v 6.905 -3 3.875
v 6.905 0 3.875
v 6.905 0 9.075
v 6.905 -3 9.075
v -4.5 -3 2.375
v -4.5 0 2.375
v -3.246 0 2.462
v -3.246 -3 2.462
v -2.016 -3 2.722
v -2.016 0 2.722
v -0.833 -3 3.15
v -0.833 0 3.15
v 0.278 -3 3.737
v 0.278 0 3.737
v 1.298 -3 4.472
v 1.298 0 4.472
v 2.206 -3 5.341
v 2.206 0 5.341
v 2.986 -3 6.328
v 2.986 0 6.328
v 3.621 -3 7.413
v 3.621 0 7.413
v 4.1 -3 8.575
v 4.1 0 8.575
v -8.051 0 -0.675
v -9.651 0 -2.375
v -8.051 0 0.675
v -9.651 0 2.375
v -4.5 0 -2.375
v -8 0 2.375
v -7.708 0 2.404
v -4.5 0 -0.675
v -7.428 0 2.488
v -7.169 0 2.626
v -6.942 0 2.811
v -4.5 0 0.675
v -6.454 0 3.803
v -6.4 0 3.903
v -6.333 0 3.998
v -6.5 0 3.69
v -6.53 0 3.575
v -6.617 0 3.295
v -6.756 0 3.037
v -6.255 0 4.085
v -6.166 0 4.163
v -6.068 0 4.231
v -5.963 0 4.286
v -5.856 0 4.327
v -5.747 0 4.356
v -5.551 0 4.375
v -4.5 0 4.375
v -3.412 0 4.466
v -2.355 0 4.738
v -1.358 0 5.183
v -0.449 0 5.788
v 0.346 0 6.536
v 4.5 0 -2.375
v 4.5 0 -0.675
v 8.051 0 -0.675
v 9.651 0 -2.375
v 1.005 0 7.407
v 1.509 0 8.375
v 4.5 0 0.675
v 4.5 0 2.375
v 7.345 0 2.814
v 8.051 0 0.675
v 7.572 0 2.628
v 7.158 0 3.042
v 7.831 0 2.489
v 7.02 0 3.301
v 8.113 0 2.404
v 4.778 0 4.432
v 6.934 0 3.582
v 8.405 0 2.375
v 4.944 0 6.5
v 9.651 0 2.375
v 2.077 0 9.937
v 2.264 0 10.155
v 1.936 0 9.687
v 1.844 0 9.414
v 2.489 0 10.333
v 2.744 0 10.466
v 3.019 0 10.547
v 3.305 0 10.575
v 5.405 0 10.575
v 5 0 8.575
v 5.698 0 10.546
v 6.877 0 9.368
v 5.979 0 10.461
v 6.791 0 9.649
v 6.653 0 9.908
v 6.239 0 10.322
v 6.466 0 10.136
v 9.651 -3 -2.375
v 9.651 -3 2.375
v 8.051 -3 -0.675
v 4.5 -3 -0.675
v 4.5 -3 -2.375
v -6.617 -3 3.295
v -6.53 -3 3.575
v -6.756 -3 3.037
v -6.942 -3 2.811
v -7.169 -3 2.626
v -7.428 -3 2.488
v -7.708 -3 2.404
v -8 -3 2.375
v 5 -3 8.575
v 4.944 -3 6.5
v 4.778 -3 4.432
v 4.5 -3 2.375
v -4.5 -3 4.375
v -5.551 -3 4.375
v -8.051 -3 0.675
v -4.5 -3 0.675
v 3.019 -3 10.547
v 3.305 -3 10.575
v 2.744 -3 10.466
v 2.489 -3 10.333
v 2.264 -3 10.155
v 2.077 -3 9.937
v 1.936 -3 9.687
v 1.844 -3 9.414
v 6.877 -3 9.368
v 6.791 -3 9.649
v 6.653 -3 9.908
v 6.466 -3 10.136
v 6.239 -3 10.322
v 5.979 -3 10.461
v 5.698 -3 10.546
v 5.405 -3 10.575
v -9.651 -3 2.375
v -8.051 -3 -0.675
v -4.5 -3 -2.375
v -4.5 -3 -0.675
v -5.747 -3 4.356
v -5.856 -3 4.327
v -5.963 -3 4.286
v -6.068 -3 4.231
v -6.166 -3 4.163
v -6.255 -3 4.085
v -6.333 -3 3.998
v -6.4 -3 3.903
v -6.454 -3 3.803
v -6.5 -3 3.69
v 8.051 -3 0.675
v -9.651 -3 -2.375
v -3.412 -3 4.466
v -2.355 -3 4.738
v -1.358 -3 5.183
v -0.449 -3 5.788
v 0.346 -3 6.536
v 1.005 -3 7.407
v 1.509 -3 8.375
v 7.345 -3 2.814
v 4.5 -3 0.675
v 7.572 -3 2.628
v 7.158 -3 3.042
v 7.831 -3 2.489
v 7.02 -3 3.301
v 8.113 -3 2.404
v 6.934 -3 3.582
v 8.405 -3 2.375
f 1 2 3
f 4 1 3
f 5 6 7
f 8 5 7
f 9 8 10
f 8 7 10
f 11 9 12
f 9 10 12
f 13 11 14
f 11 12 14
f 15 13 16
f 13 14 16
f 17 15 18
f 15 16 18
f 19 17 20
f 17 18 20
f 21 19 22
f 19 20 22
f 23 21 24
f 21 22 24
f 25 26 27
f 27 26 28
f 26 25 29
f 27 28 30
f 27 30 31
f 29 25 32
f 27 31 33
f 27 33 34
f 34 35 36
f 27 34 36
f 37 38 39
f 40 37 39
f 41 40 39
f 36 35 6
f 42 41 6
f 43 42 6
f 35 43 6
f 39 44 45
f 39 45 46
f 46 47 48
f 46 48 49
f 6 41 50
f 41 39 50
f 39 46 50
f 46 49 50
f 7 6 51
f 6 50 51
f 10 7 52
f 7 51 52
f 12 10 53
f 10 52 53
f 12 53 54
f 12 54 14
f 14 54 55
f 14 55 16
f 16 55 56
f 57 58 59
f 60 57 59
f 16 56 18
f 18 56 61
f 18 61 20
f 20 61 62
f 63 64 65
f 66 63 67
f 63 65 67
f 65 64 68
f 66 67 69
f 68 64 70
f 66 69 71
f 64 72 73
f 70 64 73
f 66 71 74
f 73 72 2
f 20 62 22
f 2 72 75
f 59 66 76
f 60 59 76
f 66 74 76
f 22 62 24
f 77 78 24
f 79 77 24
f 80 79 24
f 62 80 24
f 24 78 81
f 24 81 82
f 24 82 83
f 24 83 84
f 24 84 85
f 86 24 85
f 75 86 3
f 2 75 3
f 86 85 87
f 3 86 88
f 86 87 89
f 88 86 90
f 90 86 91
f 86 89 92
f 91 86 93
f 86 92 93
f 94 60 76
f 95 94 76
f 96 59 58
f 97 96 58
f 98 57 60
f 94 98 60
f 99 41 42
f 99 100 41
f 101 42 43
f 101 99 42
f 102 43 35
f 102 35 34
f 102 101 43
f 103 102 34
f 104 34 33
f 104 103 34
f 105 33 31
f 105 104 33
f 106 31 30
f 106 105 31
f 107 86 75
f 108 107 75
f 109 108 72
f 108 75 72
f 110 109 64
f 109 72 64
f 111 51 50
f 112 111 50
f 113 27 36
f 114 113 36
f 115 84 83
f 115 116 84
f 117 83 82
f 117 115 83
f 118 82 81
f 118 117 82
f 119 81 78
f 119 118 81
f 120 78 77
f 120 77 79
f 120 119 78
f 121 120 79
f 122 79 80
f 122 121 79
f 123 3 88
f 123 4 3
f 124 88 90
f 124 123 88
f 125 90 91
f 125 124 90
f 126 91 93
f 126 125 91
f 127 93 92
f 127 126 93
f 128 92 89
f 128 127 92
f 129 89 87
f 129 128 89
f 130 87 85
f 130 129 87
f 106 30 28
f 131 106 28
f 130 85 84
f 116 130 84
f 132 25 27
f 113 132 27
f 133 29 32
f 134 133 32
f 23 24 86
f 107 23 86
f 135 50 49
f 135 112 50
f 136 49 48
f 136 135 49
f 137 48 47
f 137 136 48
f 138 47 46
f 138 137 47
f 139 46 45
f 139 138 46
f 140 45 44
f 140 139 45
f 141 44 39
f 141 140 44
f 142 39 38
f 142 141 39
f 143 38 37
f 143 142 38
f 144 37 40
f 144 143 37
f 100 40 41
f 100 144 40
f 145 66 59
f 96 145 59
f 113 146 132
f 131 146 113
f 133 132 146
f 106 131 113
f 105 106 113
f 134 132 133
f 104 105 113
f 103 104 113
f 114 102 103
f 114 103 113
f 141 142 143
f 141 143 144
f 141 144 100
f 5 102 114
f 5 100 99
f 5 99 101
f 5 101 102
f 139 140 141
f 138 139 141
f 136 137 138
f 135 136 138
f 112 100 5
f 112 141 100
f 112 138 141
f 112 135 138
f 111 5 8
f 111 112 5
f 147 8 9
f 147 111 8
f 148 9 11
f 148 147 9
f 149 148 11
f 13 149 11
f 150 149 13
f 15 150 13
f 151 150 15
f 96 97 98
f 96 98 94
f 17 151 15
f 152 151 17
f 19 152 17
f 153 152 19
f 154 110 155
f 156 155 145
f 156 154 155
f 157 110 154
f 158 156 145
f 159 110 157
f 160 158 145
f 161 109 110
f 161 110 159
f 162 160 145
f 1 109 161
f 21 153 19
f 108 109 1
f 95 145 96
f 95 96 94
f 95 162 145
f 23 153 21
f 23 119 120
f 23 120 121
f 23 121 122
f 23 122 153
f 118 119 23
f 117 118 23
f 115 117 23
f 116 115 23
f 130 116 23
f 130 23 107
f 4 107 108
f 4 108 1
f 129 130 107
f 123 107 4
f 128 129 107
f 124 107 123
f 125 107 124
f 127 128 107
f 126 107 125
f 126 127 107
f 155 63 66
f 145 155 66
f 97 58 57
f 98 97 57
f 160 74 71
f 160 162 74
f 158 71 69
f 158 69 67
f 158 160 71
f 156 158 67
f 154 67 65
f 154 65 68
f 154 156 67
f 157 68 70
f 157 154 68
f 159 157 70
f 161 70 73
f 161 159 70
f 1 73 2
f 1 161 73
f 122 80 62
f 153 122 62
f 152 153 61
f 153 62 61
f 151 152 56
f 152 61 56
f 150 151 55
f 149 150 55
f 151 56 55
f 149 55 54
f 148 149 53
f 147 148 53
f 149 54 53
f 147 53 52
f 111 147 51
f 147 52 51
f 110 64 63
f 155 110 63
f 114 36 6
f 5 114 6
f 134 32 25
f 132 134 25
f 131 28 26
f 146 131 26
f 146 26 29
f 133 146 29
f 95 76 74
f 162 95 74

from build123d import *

# Parameters (mm, degrees)
F1_DEPTH = 3
F2_R     = 1.5
F3_R     = 1


with BuildPart() as f1:
    # F0 (on Front) → F1 (new body)
    with BuildSketch(Plane.XZ):
        with BuildLine():
            Line((8.050567, 0.675), (8.050567, -0.675))
            Line((8.050567, -0.675), (4.5, -0.675))
            Line((4.5, -0.675), (4.5, -2.375))
            Line((4.5, -2.375), (9.650567, -2.375))
            Line((9.650567, -2.375), (9.650567, 2.375))
            Line((9.650567, 2.375), (6.905382, 2.375))
            Line((6.905382, 2.375), (6.905382, 10.575))
            Line((6.905382, 10.575), (4.905382, 10.575))
            Line((4.905382, 10.575), (2.005382, 10.575))
            ThreePointArc((2.005382, 10.575), (-0.006672, 6.173255), (-4.5, 4.375))
            Line((-4.5, 4.375), (-6.5, 4.375))
            Line((-6.5, 4.375), (-6.5, 2.375))
            Line((-6.5, 2.375), (-9.650567, 2.375))
            Line((-9.650567, 2.375), (-9.650567, -2.375))
            Line((-9.650567, -2.375), (-4.5, -2.375))
            Line((-4.5, -2.375), (-4.5, -0.675))
            Line((-4.5, -0.675), (-8.050567, -0.675))
            Line((-8.050567, -0.675), (-8.050567, 0.675))
            Line((-8.050567, 0.675), (-4.5, 0.675))
            Line((-4.5, 0.675), (-4.5, 2.375))
            ThreePointArc((-4.5, 2.375), (0.800943, 4.086595), (4.1, 8.575))
            Line((4.1, 8.575), (5, 8.575))
            ThreePointArc((5, 8.575), (4.874797, 5.464936), (4.5, 2.375))
            Line((4.5, 2.375), (4.5, 0.675))
            Line((4.5, 0.675), (8.050567, 0.675))
        make_face()
    extrude(amount=F1_DEPTH)

    # F2
    f2_edges = [f1.edges().sort_by_distance(p)[0] for p in [
        (-6.5, -1.5, 2.375),
        (6.905382, -1.5, 2.375),
        (6.905382, -1.5, 10.575),
        (2.005382, -1.5, 10.575),
    ]]
    fillet(f2_edges, radius=F2_R)

    # F3
    f3_edges = [f1.edges().sort_by_distance(p)[0] for p in [
        (-6.5, -1.5, 4.375),
    ]]
    fillet(f3_edges, radius=F3_R)


solid = f1.part
